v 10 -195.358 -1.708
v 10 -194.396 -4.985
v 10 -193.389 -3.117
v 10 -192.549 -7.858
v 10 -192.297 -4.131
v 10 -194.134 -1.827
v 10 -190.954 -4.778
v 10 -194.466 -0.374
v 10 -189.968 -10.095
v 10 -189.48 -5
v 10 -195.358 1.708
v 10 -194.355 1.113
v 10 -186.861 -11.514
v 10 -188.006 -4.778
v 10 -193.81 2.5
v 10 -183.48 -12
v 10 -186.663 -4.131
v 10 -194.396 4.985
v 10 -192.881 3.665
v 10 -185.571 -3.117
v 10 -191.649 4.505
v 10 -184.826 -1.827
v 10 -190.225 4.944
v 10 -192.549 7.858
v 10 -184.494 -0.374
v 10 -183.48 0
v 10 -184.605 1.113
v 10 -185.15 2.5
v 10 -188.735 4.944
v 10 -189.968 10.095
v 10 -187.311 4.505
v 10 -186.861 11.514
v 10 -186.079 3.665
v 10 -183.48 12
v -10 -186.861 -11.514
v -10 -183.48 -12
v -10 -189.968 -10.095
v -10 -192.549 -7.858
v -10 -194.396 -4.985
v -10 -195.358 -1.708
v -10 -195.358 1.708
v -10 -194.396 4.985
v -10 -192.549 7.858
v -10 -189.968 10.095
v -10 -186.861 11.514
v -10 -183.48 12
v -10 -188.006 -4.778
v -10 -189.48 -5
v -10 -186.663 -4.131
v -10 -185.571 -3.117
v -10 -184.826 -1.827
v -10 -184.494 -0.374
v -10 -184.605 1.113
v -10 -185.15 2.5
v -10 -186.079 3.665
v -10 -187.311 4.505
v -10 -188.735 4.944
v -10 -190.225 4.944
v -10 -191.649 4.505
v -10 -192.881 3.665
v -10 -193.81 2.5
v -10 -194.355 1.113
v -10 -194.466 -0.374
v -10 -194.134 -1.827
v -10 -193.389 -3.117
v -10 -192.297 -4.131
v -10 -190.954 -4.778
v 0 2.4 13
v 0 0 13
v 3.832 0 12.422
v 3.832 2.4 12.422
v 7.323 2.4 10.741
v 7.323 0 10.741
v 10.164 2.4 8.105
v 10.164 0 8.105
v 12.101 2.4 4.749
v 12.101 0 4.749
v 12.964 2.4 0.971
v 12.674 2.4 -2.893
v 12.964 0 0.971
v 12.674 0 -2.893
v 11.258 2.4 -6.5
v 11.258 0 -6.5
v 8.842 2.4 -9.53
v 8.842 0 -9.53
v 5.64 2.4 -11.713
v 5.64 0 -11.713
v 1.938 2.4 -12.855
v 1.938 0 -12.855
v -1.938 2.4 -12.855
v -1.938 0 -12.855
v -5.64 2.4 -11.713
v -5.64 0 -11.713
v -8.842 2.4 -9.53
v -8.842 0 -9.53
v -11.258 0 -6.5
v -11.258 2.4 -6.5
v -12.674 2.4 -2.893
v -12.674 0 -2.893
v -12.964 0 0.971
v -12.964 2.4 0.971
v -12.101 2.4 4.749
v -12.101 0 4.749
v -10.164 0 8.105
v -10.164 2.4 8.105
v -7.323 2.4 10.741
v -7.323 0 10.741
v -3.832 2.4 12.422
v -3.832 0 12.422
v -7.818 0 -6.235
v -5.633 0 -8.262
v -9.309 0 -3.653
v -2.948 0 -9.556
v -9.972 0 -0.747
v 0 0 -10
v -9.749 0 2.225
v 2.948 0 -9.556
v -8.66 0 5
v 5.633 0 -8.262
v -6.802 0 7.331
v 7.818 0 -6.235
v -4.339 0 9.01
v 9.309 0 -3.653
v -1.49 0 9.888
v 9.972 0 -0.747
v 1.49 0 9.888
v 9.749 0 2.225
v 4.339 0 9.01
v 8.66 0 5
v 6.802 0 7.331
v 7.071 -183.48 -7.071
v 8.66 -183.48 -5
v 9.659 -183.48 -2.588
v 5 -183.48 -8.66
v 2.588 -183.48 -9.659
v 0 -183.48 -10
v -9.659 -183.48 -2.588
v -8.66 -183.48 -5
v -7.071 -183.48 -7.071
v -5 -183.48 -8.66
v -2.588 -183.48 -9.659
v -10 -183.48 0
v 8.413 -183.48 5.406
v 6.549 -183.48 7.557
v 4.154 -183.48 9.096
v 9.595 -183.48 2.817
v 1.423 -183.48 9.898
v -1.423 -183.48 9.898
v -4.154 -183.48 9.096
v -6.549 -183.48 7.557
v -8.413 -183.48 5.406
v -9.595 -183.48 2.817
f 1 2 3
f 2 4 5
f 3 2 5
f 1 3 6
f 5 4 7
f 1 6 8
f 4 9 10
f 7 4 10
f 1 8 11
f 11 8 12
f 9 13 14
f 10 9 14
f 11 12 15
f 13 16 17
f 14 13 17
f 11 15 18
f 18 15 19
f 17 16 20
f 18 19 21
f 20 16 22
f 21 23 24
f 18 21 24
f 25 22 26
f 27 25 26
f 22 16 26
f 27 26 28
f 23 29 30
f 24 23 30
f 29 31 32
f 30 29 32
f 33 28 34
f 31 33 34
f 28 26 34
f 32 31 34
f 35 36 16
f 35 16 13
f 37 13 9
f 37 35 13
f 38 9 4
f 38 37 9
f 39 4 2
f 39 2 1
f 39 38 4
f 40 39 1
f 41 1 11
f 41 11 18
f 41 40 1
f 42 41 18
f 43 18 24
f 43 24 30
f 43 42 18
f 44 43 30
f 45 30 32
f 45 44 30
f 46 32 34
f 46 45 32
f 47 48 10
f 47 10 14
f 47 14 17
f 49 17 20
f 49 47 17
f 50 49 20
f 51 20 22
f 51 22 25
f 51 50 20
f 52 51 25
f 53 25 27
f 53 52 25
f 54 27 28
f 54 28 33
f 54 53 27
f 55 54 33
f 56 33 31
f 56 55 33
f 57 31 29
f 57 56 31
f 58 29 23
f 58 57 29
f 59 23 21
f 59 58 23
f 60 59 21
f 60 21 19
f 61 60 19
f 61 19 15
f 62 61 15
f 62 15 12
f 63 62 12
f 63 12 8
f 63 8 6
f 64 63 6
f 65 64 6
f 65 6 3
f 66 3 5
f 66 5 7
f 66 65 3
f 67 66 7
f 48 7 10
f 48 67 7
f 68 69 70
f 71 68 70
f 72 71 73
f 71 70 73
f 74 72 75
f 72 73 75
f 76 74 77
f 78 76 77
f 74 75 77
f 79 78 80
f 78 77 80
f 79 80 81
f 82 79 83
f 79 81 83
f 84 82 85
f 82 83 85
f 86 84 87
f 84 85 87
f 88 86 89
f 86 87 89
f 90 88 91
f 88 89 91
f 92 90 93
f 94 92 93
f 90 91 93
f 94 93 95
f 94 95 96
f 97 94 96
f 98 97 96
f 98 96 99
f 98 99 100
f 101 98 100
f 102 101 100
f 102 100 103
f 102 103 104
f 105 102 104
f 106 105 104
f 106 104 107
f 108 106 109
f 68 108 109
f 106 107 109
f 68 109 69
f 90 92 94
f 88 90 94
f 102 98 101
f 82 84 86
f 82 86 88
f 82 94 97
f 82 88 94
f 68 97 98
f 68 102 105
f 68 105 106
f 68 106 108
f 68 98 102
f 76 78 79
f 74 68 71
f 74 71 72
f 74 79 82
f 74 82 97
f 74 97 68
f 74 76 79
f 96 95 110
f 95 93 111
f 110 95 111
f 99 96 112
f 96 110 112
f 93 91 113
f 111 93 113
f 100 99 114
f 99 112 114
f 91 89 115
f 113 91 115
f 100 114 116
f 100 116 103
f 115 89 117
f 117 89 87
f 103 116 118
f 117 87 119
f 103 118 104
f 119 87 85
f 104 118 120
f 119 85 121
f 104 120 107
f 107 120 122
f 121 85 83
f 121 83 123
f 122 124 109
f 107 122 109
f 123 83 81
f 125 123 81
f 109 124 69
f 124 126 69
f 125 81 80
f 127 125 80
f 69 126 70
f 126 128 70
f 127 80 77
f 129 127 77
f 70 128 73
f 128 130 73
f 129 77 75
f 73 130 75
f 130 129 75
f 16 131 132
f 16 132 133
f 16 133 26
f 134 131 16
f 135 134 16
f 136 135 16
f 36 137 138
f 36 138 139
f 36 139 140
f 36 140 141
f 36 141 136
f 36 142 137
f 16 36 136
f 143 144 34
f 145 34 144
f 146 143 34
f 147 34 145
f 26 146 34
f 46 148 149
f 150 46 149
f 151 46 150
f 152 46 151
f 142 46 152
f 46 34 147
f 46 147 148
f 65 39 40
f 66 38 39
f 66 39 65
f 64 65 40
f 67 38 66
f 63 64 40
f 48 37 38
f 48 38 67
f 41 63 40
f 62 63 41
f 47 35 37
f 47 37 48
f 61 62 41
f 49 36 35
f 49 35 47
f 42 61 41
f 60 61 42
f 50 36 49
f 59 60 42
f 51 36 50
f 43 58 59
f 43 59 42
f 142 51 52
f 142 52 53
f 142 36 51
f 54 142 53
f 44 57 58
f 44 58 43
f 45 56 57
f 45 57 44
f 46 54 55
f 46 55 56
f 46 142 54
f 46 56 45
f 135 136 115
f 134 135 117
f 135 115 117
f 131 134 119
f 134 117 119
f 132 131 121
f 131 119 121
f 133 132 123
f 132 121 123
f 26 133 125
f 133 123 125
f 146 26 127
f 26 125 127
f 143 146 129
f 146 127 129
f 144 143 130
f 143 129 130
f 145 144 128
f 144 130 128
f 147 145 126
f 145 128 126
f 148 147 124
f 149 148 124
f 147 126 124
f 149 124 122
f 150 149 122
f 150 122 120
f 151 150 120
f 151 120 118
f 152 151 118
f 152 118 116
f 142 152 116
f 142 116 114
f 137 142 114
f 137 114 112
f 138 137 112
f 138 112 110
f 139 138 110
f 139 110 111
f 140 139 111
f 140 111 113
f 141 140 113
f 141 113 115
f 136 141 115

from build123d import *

# Parameters (mm, degrees)
CROQUIS1_R                   = 13
SALIENTE_EXTRUIR1_DEPTH      = 2.4
CROQUIS2_R                   = 10
SALIENTE_EXTRUIR2_DEPTH      = 183.48
SALIENTE_EXTRUIR3_DEPTH      = 10
SALIENTE_EXTRUIR3_DEPTH_BACK = 10
CROQUIS3_R                   = 5


with BuildPart() as part:
    # Croquis1 → Saliente-Extruir1 (new body)
    with BuildSketch(Plane(origin=(0, 0, 0), x_dir=(1, 0, 0), z_dir=(0, 1, 0))):
        Circle(CROQUIS1_R)
    extrude(amount=SALIENTE_EXTRUIR1_DEPTH)

    # Croquis2 → Saliente-Extruir2 (add)
    with BuildSketch(Plane.XZ):
        Circle(CROQUIS2_R)
    extrude(amount=SALIENTE_EXTRUIR2_DEPTH)

    # Croquis3 → Saliente-Extruir3 (add, two sides: drawn at the far end of the back side and taken through both)
    with BuildSketch(Plane(origin=(0, 0, 0), x_dir=(0, 0, -1), z_dir=(1, 0, 0)).offset(-SALIENTE_EXTRUIR3_DEPTH_BACK)):
        with BuildLine():
            Line((-12, -183.48), (12, -183.48))
            ThreePointArc((12, -183.48), (0, -195.48), (-12, -183.48))
        make_face()
        with Locations((0, -189.48)):
            Circle(CROQUIS3_R, mode=Mode.SUBTRACT)
    extrude(amount=SALIENTE_EXTRUIR3_DEPTH + SALIENTE_EXTRUIR3_DEPTH_BACK)


solid = part.part
